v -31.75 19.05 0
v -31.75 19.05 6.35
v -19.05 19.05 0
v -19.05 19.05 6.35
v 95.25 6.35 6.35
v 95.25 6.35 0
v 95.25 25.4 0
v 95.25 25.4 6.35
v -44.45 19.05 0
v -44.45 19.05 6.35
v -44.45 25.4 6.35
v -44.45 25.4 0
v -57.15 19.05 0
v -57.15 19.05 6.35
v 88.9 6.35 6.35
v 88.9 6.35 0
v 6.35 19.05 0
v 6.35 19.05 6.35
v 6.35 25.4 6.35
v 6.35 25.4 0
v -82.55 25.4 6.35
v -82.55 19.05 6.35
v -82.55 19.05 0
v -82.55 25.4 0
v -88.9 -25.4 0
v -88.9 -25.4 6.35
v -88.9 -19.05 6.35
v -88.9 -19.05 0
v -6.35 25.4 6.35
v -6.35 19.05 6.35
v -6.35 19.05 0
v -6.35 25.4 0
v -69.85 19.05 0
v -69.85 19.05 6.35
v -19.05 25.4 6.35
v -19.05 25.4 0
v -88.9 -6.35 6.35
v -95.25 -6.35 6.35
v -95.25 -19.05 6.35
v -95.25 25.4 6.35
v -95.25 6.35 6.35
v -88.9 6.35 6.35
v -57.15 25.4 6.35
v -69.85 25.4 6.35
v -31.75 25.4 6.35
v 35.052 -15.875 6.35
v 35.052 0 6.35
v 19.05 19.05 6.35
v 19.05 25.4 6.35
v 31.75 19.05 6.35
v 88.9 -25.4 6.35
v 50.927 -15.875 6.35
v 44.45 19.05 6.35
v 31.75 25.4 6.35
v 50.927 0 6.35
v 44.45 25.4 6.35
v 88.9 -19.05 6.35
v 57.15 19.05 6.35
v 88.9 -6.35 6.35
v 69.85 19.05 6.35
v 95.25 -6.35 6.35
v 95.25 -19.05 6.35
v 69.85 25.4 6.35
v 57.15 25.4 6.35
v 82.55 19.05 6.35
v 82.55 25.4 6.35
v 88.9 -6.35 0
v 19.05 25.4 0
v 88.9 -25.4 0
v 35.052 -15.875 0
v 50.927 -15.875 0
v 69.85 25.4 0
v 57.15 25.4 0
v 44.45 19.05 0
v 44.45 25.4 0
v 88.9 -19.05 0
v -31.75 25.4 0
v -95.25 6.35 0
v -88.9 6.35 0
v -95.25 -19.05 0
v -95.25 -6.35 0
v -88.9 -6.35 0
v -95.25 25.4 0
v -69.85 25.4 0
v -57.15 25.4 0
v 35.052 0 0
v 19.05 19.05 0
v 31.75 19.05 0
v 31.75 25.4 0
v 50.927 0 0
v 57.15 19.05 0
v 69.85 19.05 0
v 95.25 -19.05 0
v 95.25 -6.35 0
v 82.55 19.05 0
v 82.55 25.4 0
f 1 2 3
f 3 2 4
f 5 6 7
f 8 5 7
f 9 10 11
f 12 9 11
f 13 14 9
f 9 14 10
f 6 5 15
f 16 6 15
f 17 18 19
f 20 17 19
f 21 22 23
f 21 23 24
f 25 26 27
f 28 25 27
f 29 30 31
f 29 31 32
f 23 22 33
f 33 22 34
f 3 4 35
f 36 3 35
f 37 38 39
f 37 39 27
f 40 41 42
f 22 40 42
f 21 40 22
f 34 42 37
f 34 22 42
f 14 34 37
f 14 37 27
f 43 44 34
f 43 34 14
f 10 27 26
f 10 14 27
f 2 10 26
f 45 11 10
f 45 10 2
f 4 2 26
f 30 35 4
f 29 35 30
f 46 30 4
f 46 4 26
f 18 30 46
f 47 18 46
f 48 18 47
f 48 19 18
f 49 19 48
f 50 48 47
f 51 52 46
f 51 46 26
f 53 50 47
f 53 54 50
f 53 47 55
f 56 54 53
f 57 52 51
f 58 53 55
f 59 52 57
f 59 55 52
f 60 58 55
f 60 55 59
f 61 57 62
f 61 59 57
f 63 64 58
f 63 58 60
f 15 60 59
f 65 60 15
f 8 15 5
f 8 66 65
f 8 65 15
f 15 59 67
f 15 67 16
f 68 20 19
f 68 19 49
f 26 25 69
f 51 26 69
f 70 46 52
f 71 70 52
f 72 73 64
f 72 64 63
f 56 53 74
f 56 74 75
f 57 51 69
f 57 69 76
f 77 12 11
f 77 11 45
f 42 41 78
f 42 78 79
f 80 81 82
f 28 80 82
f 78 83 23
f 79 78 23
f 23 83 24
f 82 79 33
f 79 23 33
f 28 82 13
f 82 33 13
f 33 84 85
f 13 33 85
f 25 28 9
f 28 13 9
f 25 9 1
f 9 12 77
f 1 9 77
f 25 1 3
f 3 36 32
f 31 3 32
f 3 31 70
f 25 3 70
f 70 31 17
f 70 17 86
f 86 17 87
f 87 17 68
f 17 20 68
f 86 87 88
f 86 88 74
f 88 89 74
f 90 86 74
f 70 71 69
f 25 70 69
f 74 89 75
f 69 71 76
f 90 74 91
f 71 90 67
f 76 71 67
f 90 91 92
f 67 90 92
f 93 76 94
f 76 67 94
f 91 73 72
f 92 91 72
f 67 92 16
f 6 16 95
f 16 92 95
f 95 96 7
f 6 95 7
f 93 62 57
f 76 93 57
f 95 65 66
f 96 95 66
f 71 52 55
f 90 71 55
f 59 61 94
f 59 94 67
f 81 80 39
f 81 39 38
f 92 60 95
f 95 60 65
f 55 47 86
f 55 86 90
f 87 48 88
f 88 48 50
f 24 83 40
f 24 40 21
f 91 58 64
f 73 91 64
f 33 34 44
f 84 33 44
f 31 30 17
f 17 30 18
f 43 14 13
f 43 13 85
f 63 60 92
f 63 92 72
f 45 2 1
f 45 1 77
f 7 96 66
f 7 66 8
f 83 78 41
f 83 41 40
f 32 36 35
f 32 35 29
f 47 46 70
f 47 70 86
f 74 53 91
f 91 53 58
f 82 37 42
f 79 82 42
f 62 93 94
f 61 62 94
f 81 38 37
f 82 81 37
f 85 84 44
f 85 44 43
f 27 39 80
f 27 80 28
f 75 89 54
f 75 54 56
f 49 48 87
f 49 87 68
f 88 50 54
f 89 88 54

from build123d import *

# Parameters (mm, degrees)
SKETCH1_W           = 190.5
SKETCH1_H           = 50.8
BOSS_EXTRUDE1_DEPTH = 6.35
SKETCH2_W           = 6.35
SKETCH2_H           = 12.7
CUT_EXTRUDE1_DEPTH  = 7.35
SKETCH3_W           = 6.35
SKETCH3_H           = 6.35
CUT_EXTRUDE2_DEPTH  = 7.35
SKETCH4_W           = 12.7
SKETCH4_H           = 6.35
CUT_EXTRUDE3_DEPTH  = 7.35
LPATTERN1_COUNT     = 7
LPATTERN1_PITCH     = 25.4
SKETCH5_W           = 15.875
SKETCH5_H           = 15.875
CUT_EXTRUDE4_DEPTH  = 7.35


with BuildPart() as part:
    # Sketch1 → Boss-Extrude1 (new body)
    with BuildSketch(Plane.XY):
        Rectangle(SKETCH1_W, SKETCH1_H)
    extrude(amount=BOSS_EXTRUDE1_DEPTH)

    # Sketch2 → Cut-Extrude1 (cut, through all)
    with BuildSketch(Plane.XY.offset(6.35)):
        with Locations((-92.075, 0)):
            Rectangle(SKETCH2_W, SKETCH2_H)
    cut_extrude1 = extrude(amount=-CUT_EXTRUDE1_DEPTH, mode=Mode.SUBTRACT)

    # Sketch3 → Cut-Extrude2 (cut, through all)
    with BuildSketch(Plane.XY.offset(6.35)):
        with Locations((-92.075, -22.225)):
            Rectangle(SKETCH3_W, SKETCH3_H)
    cut_extrude2 = extrude(amount=-CUT_EXTRUDE2_DEPTH, mode=Mode.SUBTRACT)

    # Mirror1: Cut-Extrude2 across plane
    add(cut_extrude2.mirror(Plane(origin=(0, 0, 0), x_dir=(0, 0, 1), z_dir=(1, 0, 0))), mode=Mode.SUBTRACT)

    # Mirror2: Cut-Extrude1 across plane
    add(cut_extrude1.mirror(Plane(origin=(0, 0, 0), x_dir=(0, 0, 1), z_dir=(1, 0, 0))), mode=Mode.SUBTRACT)

    # Sketch4 → Cut-Extrude3 (cut, through all)
    with BuildSketch(Plane.XY.offset(6.35)):
        with Locations((-76.2, 22.225)):
            Rectangle(SKETCH4_W, SKETCH4_H)
    cut_extrude3 = extrude(amount=-CUT_EXTRUDE3_DEPTH, mode=Mode.SUBTRACT)

    # LPattern1: Cut-Extrude3 ×7
    with Locations(*[(i * LPATTERN1_PITCH, 0, 0) for i in range(1, LPATTERN1_COUNT)]):
        add(cut_extrude3, mode=Mode.SUBTRACT)

    # Sketch5 → Cut-Extrude4 (cut, through all)
    with BuildSketch(Plane.XY.offset(6.35)):
        with Locations((42.9895, -7.9375)):
            Rectangle(SKETCH5_W, SKETCH5_H)
    extrude(amount=-CUT_EXTRUDE4_DEPTH, mode=Mode.SUBTRACT)


solid = part.part
